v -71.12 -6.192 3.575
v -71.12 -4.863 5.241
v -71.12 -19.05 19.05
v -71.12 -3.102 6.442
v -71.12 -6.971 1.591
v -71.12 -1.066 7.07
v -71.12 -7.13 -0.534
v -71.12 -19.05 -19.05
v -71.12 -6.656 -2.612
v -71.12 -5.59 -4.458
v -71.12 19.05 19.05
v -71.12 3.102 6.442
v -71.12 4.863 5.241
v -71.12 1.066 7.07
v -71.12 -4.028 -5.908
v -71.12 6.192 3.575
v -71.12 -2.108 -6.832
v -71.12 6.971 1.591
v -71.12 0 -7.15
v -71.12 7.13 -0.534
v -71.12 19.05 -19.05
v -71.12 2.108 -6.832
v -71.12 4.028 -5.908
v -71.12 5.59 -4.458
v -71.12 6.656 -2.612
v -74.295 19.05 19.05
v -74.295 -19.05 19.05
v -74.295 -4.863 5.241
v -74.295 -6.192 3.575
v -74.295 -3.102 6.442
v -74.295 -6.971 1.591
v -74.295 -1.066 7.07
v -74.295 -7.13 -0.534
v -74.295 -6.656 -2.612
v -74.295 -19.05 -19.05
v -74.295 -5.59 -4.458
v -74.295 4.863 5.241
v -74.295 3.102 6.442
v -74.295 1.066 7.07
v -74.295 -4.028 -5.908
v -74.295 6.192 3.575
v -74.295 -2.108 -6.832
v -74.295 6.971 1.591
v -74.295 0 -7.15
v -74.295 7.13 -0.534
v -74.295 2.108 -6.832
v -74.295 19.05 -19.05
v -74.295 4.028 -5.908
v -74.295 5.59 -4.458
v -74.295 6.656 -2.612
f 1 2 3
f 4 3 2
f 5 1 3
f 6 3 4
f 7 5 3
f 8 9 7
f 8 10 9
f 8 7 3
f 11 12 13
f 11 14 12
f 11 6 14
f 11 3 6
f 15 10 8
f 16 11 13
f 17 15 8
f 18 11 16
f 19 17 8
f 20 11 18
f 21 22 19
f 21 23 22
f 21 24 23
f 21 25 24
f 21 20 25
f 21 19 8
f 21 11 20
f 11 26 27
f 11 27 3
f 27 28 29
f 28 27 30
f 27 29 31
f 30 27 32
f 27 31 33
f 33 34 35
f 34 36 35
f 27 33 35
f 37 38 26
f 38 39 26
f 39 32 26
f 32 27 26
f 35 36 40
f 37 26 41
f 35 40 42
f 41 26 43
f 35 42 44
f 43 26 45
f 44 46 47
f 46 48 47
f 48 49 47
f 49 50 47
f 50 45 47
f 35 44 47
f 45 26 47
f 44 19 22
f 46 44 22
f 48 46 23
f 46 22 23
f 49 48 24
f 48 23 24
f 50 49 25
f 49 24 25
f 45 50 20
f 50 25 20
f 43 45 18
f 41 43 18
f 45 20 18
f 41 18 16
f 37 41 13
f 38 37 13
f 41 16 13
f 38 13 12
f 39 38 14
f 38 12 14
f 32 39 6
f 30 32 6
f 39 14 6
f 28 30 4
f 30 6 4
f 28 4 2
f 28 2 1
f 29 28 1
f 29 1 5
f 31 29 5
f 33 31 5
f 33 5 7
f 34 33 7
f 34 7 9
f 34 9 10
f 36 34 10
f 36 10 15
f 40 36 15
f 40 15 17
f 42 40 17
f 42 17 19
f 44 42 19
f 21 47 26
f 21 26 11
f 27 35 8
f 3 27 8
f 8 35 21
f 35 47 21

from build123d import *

# Parameters (mm, degrees)
SKETCH3_W                   = 3.175
SKETCH3_H                   = 38.1
APERTURE_PLATE_F_DEPTH      = 19.05
APERTURE_PLATE_F_DEPTH_BACK = 19.05
APERTURE_F_REACH            = 5.175
SKETCH6_R                   = 7.1501


with BuildPart() as part:
    # Sketch3 → APERTURE_PLATE_F (new body, two sides)
    with BuildSketch(Plane(origin=(0, 0, 0), x_dir=(1, 0, 0), z_dir=(0, 1, 0))) as aperture_plate_f_sk:
        with Locations((-72.7075, 0)):
            Rectangle(SKETCH3_W, SKETCH3_H)
    extrude(amount=APERTURE_PLATE_F_DEPTH)
    extrude(aperture_plate_f_sk.sketch, amount=-APERTURE_PLATE_F_DEPTH_BACK)

    # Sketch6 → APERTURE_F (cut, up to next)
    with BuildSketch(Plane(origin=(-71.12, 0, 0), x_dir=(0, 0, -1), z_dir=(1, 0, 0)), mode=Mode.PRIVATE) as aperture_f_sk1:
        Circle(SKETCH6_R)
    aperture_f_tool1 = extrude(aperture_f_sk1.sketch, amount=-APERTURE_F_REACH, mode=Mode.PRIVATE) & part.part
    add(aperture_f_tool1.solids().sort_by_distance((-71.12, 0, 0))[0], mode=Mode.SUBTRACT)


solid = part.part
